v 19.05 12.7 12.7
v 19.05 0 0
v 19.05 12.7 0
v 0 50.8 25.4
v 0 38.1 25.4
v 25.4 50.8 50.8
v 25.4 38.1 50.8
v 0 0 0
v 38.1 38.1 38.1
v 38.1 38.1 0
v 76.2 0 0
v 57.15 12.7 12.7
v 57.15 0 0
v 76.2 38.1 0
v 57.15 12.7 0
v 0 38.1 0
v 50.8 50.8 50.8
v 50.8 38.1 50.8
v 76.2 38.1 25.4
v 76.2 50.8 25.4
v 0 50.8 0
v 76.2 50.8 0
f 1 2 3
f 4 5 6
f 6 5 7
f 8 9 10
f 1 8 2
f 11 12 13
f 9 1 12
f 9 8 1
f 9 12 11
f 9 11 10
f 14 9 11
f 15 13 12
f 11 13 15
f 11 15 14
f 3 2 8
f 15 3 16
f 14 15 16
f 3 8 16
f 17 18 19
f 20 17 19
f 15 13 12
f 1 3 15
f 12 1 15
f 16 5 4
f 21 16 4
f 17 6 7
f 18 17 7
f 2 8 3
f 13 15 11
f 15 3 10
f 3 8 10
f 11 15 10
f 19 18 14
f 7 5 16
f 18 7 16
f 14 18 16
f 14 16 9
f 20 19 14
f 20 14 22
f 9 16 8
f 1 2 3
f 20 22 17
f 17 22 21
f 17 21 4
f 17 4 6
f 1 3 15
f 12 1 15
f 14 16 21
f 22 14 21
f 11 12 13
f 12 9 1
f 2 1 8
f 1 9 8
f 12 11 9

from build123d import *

# Parameters (mm, degrees)
F2_W      = 12.7
F2_H      = 25.4
F3_DEPTH  = 76.2
F4_DEPTH  = 50.801
F6_DEPTH  = 50.8
F7_DEPTH  = 38.1
F8_DEPTH  = 76.2
F9_DEPTH  = 50.801
F11_DEPTH = 155
F13_DEPTH = 76.2
F1_W      = 38.1
F1_H      = 12.7
F14_DEPTH = 12.7


# Not quite as in the source:
# - an extrude ends at something that could not be found from the text; its depth is read off the source's solid


with BuildPart() as f3:
    # F2 (on Right) → F3 (new body)
    with BuildSketch(Plane.YZ):
        Polygon((38.1, 50.8), (38.1, 38.1), (38.1, 25.4), (50.8, 25.4), (50.8, 50.8), align=None)
        with Locations((44.45, 12.7)):
            Rectangle(F2_W, F2_H)
    extrude(amount=F3_DEPTH)

    # F0 (on Front) → F4 (cut, through all)
    with BuildSketch(Plane.XZ):
        Polygon((0, 50.8), (0, 25.4), (25.4, 50.8), align=None)
        Polygon((76.2, 50.8), (50.8, 50.8), (76.2, 25.4), align=None)
    extrude(amount=-F4_DEPTH, mode=Mode.SUBTRACT)


with BuildPart() as f6:
    # F5 (on face) → F6 (new body)
    with BuildSketch(Plane.XY.offset(50.8)):
        Polygon((76.2, 0), (38.1, 38.1), (0, 0), align=None)
    extrude(amount=-F6_DEPTH)

    # F0 (on Front) → F7 (cut, through all)
    with BuildSketch(Plane.XZ):
        Polygon((0, 25.4), (0, 0), (38.1, 38.1), (76.2, 0), (76.2, 25.4), (50.8, 50.8), (25.4, 50.8), align=None)
    extrude(amount=-F7_DEPTH, mode=Mode.SUBTRACT)


with BuildPart() as f8:
    # F2 (on Right) → F8 (new body)
    with BuildSketch(Plane.YZ):
        Polygon((38.1, 38.1), (0, 0), (38.1, 0), (38.1, 25.4), align=None)
    extrude(amount=F8_DEPTH)


with BuildPart() as f9_tool:
    # F9 (cut, through all): faces of the model
    f9_faces = [f6.part.faces().sort_by_distance(p)[0] for p in [
        (67.7333333333, 0, 42.3333333333),
        (8.4666666667, 0, 42.3333333333),
    ]]
    extrude(f9_faces, amount=-F9_DEPTH)


with BuildPart() as f6_1:
    add(f6.part)

    # F9: cut by f9_tool
    add(f9_tool.part, mode=Mode.SUBTRACT)

    # F10 (on face) → F11 (cut, through all)
    with BuildSketch(Plane(origin=(0, 0, 0), x_dir=(1, 0, 0), z_dir=(0, -0.7071067812, 0.7071067812))):
        Polygon((63.5, 53.8815367264), (12.7, 53.8815367264), (0, 35.9210244843), (0, 0), (76.2, 0), (76.2, 35.9210244843), align=None)
    extrude(amount=F11_DEPTH, mode=Mode.SUBTRACT)


with BuildPart() as f8_1:
    add(f8.part)

    # F9: cut by f9_tool
    add(f9_tool.part, mode=Mode.SUBTRACT)

    # F12 (on face) → F13 (cut)
    with BuildSketch(Plane.XZ.offset(-38.1)):
        Polygon((76.2, 38.1), (38.1, 38.1), (76.2, 0), align=None)
        Polygon((0, 0), (38.1, 38.1), (0, 38.1), align=None)
    extrude(amount=F13_DEPTH, mode=Mode.SUBTRACT)


with BuildPart() as f14_tool:
    # F1 (on Top) → F14 (new body)
    with BuildSketch(Plane.XY):
        with Locations((38.1, 6.35)):
            Rectangle(F1_W, F1_H)
    extrude(amount=F14_DEPTH)


with BuildPart() as f6_2:
    add(f6_1.part)

    # F14: cut by f14_tool
    add(f14_tool.part, mode=Mode.SUBTRACT)


with BuildPart() as f8_2:
    add(f8_1.part)

    # F14: cut by f14_tool
    add(f14_tool.part, mode=Mode.SUBTRACT)


solid = Compound([f3.part, f6_2.part, f8_2.part])
